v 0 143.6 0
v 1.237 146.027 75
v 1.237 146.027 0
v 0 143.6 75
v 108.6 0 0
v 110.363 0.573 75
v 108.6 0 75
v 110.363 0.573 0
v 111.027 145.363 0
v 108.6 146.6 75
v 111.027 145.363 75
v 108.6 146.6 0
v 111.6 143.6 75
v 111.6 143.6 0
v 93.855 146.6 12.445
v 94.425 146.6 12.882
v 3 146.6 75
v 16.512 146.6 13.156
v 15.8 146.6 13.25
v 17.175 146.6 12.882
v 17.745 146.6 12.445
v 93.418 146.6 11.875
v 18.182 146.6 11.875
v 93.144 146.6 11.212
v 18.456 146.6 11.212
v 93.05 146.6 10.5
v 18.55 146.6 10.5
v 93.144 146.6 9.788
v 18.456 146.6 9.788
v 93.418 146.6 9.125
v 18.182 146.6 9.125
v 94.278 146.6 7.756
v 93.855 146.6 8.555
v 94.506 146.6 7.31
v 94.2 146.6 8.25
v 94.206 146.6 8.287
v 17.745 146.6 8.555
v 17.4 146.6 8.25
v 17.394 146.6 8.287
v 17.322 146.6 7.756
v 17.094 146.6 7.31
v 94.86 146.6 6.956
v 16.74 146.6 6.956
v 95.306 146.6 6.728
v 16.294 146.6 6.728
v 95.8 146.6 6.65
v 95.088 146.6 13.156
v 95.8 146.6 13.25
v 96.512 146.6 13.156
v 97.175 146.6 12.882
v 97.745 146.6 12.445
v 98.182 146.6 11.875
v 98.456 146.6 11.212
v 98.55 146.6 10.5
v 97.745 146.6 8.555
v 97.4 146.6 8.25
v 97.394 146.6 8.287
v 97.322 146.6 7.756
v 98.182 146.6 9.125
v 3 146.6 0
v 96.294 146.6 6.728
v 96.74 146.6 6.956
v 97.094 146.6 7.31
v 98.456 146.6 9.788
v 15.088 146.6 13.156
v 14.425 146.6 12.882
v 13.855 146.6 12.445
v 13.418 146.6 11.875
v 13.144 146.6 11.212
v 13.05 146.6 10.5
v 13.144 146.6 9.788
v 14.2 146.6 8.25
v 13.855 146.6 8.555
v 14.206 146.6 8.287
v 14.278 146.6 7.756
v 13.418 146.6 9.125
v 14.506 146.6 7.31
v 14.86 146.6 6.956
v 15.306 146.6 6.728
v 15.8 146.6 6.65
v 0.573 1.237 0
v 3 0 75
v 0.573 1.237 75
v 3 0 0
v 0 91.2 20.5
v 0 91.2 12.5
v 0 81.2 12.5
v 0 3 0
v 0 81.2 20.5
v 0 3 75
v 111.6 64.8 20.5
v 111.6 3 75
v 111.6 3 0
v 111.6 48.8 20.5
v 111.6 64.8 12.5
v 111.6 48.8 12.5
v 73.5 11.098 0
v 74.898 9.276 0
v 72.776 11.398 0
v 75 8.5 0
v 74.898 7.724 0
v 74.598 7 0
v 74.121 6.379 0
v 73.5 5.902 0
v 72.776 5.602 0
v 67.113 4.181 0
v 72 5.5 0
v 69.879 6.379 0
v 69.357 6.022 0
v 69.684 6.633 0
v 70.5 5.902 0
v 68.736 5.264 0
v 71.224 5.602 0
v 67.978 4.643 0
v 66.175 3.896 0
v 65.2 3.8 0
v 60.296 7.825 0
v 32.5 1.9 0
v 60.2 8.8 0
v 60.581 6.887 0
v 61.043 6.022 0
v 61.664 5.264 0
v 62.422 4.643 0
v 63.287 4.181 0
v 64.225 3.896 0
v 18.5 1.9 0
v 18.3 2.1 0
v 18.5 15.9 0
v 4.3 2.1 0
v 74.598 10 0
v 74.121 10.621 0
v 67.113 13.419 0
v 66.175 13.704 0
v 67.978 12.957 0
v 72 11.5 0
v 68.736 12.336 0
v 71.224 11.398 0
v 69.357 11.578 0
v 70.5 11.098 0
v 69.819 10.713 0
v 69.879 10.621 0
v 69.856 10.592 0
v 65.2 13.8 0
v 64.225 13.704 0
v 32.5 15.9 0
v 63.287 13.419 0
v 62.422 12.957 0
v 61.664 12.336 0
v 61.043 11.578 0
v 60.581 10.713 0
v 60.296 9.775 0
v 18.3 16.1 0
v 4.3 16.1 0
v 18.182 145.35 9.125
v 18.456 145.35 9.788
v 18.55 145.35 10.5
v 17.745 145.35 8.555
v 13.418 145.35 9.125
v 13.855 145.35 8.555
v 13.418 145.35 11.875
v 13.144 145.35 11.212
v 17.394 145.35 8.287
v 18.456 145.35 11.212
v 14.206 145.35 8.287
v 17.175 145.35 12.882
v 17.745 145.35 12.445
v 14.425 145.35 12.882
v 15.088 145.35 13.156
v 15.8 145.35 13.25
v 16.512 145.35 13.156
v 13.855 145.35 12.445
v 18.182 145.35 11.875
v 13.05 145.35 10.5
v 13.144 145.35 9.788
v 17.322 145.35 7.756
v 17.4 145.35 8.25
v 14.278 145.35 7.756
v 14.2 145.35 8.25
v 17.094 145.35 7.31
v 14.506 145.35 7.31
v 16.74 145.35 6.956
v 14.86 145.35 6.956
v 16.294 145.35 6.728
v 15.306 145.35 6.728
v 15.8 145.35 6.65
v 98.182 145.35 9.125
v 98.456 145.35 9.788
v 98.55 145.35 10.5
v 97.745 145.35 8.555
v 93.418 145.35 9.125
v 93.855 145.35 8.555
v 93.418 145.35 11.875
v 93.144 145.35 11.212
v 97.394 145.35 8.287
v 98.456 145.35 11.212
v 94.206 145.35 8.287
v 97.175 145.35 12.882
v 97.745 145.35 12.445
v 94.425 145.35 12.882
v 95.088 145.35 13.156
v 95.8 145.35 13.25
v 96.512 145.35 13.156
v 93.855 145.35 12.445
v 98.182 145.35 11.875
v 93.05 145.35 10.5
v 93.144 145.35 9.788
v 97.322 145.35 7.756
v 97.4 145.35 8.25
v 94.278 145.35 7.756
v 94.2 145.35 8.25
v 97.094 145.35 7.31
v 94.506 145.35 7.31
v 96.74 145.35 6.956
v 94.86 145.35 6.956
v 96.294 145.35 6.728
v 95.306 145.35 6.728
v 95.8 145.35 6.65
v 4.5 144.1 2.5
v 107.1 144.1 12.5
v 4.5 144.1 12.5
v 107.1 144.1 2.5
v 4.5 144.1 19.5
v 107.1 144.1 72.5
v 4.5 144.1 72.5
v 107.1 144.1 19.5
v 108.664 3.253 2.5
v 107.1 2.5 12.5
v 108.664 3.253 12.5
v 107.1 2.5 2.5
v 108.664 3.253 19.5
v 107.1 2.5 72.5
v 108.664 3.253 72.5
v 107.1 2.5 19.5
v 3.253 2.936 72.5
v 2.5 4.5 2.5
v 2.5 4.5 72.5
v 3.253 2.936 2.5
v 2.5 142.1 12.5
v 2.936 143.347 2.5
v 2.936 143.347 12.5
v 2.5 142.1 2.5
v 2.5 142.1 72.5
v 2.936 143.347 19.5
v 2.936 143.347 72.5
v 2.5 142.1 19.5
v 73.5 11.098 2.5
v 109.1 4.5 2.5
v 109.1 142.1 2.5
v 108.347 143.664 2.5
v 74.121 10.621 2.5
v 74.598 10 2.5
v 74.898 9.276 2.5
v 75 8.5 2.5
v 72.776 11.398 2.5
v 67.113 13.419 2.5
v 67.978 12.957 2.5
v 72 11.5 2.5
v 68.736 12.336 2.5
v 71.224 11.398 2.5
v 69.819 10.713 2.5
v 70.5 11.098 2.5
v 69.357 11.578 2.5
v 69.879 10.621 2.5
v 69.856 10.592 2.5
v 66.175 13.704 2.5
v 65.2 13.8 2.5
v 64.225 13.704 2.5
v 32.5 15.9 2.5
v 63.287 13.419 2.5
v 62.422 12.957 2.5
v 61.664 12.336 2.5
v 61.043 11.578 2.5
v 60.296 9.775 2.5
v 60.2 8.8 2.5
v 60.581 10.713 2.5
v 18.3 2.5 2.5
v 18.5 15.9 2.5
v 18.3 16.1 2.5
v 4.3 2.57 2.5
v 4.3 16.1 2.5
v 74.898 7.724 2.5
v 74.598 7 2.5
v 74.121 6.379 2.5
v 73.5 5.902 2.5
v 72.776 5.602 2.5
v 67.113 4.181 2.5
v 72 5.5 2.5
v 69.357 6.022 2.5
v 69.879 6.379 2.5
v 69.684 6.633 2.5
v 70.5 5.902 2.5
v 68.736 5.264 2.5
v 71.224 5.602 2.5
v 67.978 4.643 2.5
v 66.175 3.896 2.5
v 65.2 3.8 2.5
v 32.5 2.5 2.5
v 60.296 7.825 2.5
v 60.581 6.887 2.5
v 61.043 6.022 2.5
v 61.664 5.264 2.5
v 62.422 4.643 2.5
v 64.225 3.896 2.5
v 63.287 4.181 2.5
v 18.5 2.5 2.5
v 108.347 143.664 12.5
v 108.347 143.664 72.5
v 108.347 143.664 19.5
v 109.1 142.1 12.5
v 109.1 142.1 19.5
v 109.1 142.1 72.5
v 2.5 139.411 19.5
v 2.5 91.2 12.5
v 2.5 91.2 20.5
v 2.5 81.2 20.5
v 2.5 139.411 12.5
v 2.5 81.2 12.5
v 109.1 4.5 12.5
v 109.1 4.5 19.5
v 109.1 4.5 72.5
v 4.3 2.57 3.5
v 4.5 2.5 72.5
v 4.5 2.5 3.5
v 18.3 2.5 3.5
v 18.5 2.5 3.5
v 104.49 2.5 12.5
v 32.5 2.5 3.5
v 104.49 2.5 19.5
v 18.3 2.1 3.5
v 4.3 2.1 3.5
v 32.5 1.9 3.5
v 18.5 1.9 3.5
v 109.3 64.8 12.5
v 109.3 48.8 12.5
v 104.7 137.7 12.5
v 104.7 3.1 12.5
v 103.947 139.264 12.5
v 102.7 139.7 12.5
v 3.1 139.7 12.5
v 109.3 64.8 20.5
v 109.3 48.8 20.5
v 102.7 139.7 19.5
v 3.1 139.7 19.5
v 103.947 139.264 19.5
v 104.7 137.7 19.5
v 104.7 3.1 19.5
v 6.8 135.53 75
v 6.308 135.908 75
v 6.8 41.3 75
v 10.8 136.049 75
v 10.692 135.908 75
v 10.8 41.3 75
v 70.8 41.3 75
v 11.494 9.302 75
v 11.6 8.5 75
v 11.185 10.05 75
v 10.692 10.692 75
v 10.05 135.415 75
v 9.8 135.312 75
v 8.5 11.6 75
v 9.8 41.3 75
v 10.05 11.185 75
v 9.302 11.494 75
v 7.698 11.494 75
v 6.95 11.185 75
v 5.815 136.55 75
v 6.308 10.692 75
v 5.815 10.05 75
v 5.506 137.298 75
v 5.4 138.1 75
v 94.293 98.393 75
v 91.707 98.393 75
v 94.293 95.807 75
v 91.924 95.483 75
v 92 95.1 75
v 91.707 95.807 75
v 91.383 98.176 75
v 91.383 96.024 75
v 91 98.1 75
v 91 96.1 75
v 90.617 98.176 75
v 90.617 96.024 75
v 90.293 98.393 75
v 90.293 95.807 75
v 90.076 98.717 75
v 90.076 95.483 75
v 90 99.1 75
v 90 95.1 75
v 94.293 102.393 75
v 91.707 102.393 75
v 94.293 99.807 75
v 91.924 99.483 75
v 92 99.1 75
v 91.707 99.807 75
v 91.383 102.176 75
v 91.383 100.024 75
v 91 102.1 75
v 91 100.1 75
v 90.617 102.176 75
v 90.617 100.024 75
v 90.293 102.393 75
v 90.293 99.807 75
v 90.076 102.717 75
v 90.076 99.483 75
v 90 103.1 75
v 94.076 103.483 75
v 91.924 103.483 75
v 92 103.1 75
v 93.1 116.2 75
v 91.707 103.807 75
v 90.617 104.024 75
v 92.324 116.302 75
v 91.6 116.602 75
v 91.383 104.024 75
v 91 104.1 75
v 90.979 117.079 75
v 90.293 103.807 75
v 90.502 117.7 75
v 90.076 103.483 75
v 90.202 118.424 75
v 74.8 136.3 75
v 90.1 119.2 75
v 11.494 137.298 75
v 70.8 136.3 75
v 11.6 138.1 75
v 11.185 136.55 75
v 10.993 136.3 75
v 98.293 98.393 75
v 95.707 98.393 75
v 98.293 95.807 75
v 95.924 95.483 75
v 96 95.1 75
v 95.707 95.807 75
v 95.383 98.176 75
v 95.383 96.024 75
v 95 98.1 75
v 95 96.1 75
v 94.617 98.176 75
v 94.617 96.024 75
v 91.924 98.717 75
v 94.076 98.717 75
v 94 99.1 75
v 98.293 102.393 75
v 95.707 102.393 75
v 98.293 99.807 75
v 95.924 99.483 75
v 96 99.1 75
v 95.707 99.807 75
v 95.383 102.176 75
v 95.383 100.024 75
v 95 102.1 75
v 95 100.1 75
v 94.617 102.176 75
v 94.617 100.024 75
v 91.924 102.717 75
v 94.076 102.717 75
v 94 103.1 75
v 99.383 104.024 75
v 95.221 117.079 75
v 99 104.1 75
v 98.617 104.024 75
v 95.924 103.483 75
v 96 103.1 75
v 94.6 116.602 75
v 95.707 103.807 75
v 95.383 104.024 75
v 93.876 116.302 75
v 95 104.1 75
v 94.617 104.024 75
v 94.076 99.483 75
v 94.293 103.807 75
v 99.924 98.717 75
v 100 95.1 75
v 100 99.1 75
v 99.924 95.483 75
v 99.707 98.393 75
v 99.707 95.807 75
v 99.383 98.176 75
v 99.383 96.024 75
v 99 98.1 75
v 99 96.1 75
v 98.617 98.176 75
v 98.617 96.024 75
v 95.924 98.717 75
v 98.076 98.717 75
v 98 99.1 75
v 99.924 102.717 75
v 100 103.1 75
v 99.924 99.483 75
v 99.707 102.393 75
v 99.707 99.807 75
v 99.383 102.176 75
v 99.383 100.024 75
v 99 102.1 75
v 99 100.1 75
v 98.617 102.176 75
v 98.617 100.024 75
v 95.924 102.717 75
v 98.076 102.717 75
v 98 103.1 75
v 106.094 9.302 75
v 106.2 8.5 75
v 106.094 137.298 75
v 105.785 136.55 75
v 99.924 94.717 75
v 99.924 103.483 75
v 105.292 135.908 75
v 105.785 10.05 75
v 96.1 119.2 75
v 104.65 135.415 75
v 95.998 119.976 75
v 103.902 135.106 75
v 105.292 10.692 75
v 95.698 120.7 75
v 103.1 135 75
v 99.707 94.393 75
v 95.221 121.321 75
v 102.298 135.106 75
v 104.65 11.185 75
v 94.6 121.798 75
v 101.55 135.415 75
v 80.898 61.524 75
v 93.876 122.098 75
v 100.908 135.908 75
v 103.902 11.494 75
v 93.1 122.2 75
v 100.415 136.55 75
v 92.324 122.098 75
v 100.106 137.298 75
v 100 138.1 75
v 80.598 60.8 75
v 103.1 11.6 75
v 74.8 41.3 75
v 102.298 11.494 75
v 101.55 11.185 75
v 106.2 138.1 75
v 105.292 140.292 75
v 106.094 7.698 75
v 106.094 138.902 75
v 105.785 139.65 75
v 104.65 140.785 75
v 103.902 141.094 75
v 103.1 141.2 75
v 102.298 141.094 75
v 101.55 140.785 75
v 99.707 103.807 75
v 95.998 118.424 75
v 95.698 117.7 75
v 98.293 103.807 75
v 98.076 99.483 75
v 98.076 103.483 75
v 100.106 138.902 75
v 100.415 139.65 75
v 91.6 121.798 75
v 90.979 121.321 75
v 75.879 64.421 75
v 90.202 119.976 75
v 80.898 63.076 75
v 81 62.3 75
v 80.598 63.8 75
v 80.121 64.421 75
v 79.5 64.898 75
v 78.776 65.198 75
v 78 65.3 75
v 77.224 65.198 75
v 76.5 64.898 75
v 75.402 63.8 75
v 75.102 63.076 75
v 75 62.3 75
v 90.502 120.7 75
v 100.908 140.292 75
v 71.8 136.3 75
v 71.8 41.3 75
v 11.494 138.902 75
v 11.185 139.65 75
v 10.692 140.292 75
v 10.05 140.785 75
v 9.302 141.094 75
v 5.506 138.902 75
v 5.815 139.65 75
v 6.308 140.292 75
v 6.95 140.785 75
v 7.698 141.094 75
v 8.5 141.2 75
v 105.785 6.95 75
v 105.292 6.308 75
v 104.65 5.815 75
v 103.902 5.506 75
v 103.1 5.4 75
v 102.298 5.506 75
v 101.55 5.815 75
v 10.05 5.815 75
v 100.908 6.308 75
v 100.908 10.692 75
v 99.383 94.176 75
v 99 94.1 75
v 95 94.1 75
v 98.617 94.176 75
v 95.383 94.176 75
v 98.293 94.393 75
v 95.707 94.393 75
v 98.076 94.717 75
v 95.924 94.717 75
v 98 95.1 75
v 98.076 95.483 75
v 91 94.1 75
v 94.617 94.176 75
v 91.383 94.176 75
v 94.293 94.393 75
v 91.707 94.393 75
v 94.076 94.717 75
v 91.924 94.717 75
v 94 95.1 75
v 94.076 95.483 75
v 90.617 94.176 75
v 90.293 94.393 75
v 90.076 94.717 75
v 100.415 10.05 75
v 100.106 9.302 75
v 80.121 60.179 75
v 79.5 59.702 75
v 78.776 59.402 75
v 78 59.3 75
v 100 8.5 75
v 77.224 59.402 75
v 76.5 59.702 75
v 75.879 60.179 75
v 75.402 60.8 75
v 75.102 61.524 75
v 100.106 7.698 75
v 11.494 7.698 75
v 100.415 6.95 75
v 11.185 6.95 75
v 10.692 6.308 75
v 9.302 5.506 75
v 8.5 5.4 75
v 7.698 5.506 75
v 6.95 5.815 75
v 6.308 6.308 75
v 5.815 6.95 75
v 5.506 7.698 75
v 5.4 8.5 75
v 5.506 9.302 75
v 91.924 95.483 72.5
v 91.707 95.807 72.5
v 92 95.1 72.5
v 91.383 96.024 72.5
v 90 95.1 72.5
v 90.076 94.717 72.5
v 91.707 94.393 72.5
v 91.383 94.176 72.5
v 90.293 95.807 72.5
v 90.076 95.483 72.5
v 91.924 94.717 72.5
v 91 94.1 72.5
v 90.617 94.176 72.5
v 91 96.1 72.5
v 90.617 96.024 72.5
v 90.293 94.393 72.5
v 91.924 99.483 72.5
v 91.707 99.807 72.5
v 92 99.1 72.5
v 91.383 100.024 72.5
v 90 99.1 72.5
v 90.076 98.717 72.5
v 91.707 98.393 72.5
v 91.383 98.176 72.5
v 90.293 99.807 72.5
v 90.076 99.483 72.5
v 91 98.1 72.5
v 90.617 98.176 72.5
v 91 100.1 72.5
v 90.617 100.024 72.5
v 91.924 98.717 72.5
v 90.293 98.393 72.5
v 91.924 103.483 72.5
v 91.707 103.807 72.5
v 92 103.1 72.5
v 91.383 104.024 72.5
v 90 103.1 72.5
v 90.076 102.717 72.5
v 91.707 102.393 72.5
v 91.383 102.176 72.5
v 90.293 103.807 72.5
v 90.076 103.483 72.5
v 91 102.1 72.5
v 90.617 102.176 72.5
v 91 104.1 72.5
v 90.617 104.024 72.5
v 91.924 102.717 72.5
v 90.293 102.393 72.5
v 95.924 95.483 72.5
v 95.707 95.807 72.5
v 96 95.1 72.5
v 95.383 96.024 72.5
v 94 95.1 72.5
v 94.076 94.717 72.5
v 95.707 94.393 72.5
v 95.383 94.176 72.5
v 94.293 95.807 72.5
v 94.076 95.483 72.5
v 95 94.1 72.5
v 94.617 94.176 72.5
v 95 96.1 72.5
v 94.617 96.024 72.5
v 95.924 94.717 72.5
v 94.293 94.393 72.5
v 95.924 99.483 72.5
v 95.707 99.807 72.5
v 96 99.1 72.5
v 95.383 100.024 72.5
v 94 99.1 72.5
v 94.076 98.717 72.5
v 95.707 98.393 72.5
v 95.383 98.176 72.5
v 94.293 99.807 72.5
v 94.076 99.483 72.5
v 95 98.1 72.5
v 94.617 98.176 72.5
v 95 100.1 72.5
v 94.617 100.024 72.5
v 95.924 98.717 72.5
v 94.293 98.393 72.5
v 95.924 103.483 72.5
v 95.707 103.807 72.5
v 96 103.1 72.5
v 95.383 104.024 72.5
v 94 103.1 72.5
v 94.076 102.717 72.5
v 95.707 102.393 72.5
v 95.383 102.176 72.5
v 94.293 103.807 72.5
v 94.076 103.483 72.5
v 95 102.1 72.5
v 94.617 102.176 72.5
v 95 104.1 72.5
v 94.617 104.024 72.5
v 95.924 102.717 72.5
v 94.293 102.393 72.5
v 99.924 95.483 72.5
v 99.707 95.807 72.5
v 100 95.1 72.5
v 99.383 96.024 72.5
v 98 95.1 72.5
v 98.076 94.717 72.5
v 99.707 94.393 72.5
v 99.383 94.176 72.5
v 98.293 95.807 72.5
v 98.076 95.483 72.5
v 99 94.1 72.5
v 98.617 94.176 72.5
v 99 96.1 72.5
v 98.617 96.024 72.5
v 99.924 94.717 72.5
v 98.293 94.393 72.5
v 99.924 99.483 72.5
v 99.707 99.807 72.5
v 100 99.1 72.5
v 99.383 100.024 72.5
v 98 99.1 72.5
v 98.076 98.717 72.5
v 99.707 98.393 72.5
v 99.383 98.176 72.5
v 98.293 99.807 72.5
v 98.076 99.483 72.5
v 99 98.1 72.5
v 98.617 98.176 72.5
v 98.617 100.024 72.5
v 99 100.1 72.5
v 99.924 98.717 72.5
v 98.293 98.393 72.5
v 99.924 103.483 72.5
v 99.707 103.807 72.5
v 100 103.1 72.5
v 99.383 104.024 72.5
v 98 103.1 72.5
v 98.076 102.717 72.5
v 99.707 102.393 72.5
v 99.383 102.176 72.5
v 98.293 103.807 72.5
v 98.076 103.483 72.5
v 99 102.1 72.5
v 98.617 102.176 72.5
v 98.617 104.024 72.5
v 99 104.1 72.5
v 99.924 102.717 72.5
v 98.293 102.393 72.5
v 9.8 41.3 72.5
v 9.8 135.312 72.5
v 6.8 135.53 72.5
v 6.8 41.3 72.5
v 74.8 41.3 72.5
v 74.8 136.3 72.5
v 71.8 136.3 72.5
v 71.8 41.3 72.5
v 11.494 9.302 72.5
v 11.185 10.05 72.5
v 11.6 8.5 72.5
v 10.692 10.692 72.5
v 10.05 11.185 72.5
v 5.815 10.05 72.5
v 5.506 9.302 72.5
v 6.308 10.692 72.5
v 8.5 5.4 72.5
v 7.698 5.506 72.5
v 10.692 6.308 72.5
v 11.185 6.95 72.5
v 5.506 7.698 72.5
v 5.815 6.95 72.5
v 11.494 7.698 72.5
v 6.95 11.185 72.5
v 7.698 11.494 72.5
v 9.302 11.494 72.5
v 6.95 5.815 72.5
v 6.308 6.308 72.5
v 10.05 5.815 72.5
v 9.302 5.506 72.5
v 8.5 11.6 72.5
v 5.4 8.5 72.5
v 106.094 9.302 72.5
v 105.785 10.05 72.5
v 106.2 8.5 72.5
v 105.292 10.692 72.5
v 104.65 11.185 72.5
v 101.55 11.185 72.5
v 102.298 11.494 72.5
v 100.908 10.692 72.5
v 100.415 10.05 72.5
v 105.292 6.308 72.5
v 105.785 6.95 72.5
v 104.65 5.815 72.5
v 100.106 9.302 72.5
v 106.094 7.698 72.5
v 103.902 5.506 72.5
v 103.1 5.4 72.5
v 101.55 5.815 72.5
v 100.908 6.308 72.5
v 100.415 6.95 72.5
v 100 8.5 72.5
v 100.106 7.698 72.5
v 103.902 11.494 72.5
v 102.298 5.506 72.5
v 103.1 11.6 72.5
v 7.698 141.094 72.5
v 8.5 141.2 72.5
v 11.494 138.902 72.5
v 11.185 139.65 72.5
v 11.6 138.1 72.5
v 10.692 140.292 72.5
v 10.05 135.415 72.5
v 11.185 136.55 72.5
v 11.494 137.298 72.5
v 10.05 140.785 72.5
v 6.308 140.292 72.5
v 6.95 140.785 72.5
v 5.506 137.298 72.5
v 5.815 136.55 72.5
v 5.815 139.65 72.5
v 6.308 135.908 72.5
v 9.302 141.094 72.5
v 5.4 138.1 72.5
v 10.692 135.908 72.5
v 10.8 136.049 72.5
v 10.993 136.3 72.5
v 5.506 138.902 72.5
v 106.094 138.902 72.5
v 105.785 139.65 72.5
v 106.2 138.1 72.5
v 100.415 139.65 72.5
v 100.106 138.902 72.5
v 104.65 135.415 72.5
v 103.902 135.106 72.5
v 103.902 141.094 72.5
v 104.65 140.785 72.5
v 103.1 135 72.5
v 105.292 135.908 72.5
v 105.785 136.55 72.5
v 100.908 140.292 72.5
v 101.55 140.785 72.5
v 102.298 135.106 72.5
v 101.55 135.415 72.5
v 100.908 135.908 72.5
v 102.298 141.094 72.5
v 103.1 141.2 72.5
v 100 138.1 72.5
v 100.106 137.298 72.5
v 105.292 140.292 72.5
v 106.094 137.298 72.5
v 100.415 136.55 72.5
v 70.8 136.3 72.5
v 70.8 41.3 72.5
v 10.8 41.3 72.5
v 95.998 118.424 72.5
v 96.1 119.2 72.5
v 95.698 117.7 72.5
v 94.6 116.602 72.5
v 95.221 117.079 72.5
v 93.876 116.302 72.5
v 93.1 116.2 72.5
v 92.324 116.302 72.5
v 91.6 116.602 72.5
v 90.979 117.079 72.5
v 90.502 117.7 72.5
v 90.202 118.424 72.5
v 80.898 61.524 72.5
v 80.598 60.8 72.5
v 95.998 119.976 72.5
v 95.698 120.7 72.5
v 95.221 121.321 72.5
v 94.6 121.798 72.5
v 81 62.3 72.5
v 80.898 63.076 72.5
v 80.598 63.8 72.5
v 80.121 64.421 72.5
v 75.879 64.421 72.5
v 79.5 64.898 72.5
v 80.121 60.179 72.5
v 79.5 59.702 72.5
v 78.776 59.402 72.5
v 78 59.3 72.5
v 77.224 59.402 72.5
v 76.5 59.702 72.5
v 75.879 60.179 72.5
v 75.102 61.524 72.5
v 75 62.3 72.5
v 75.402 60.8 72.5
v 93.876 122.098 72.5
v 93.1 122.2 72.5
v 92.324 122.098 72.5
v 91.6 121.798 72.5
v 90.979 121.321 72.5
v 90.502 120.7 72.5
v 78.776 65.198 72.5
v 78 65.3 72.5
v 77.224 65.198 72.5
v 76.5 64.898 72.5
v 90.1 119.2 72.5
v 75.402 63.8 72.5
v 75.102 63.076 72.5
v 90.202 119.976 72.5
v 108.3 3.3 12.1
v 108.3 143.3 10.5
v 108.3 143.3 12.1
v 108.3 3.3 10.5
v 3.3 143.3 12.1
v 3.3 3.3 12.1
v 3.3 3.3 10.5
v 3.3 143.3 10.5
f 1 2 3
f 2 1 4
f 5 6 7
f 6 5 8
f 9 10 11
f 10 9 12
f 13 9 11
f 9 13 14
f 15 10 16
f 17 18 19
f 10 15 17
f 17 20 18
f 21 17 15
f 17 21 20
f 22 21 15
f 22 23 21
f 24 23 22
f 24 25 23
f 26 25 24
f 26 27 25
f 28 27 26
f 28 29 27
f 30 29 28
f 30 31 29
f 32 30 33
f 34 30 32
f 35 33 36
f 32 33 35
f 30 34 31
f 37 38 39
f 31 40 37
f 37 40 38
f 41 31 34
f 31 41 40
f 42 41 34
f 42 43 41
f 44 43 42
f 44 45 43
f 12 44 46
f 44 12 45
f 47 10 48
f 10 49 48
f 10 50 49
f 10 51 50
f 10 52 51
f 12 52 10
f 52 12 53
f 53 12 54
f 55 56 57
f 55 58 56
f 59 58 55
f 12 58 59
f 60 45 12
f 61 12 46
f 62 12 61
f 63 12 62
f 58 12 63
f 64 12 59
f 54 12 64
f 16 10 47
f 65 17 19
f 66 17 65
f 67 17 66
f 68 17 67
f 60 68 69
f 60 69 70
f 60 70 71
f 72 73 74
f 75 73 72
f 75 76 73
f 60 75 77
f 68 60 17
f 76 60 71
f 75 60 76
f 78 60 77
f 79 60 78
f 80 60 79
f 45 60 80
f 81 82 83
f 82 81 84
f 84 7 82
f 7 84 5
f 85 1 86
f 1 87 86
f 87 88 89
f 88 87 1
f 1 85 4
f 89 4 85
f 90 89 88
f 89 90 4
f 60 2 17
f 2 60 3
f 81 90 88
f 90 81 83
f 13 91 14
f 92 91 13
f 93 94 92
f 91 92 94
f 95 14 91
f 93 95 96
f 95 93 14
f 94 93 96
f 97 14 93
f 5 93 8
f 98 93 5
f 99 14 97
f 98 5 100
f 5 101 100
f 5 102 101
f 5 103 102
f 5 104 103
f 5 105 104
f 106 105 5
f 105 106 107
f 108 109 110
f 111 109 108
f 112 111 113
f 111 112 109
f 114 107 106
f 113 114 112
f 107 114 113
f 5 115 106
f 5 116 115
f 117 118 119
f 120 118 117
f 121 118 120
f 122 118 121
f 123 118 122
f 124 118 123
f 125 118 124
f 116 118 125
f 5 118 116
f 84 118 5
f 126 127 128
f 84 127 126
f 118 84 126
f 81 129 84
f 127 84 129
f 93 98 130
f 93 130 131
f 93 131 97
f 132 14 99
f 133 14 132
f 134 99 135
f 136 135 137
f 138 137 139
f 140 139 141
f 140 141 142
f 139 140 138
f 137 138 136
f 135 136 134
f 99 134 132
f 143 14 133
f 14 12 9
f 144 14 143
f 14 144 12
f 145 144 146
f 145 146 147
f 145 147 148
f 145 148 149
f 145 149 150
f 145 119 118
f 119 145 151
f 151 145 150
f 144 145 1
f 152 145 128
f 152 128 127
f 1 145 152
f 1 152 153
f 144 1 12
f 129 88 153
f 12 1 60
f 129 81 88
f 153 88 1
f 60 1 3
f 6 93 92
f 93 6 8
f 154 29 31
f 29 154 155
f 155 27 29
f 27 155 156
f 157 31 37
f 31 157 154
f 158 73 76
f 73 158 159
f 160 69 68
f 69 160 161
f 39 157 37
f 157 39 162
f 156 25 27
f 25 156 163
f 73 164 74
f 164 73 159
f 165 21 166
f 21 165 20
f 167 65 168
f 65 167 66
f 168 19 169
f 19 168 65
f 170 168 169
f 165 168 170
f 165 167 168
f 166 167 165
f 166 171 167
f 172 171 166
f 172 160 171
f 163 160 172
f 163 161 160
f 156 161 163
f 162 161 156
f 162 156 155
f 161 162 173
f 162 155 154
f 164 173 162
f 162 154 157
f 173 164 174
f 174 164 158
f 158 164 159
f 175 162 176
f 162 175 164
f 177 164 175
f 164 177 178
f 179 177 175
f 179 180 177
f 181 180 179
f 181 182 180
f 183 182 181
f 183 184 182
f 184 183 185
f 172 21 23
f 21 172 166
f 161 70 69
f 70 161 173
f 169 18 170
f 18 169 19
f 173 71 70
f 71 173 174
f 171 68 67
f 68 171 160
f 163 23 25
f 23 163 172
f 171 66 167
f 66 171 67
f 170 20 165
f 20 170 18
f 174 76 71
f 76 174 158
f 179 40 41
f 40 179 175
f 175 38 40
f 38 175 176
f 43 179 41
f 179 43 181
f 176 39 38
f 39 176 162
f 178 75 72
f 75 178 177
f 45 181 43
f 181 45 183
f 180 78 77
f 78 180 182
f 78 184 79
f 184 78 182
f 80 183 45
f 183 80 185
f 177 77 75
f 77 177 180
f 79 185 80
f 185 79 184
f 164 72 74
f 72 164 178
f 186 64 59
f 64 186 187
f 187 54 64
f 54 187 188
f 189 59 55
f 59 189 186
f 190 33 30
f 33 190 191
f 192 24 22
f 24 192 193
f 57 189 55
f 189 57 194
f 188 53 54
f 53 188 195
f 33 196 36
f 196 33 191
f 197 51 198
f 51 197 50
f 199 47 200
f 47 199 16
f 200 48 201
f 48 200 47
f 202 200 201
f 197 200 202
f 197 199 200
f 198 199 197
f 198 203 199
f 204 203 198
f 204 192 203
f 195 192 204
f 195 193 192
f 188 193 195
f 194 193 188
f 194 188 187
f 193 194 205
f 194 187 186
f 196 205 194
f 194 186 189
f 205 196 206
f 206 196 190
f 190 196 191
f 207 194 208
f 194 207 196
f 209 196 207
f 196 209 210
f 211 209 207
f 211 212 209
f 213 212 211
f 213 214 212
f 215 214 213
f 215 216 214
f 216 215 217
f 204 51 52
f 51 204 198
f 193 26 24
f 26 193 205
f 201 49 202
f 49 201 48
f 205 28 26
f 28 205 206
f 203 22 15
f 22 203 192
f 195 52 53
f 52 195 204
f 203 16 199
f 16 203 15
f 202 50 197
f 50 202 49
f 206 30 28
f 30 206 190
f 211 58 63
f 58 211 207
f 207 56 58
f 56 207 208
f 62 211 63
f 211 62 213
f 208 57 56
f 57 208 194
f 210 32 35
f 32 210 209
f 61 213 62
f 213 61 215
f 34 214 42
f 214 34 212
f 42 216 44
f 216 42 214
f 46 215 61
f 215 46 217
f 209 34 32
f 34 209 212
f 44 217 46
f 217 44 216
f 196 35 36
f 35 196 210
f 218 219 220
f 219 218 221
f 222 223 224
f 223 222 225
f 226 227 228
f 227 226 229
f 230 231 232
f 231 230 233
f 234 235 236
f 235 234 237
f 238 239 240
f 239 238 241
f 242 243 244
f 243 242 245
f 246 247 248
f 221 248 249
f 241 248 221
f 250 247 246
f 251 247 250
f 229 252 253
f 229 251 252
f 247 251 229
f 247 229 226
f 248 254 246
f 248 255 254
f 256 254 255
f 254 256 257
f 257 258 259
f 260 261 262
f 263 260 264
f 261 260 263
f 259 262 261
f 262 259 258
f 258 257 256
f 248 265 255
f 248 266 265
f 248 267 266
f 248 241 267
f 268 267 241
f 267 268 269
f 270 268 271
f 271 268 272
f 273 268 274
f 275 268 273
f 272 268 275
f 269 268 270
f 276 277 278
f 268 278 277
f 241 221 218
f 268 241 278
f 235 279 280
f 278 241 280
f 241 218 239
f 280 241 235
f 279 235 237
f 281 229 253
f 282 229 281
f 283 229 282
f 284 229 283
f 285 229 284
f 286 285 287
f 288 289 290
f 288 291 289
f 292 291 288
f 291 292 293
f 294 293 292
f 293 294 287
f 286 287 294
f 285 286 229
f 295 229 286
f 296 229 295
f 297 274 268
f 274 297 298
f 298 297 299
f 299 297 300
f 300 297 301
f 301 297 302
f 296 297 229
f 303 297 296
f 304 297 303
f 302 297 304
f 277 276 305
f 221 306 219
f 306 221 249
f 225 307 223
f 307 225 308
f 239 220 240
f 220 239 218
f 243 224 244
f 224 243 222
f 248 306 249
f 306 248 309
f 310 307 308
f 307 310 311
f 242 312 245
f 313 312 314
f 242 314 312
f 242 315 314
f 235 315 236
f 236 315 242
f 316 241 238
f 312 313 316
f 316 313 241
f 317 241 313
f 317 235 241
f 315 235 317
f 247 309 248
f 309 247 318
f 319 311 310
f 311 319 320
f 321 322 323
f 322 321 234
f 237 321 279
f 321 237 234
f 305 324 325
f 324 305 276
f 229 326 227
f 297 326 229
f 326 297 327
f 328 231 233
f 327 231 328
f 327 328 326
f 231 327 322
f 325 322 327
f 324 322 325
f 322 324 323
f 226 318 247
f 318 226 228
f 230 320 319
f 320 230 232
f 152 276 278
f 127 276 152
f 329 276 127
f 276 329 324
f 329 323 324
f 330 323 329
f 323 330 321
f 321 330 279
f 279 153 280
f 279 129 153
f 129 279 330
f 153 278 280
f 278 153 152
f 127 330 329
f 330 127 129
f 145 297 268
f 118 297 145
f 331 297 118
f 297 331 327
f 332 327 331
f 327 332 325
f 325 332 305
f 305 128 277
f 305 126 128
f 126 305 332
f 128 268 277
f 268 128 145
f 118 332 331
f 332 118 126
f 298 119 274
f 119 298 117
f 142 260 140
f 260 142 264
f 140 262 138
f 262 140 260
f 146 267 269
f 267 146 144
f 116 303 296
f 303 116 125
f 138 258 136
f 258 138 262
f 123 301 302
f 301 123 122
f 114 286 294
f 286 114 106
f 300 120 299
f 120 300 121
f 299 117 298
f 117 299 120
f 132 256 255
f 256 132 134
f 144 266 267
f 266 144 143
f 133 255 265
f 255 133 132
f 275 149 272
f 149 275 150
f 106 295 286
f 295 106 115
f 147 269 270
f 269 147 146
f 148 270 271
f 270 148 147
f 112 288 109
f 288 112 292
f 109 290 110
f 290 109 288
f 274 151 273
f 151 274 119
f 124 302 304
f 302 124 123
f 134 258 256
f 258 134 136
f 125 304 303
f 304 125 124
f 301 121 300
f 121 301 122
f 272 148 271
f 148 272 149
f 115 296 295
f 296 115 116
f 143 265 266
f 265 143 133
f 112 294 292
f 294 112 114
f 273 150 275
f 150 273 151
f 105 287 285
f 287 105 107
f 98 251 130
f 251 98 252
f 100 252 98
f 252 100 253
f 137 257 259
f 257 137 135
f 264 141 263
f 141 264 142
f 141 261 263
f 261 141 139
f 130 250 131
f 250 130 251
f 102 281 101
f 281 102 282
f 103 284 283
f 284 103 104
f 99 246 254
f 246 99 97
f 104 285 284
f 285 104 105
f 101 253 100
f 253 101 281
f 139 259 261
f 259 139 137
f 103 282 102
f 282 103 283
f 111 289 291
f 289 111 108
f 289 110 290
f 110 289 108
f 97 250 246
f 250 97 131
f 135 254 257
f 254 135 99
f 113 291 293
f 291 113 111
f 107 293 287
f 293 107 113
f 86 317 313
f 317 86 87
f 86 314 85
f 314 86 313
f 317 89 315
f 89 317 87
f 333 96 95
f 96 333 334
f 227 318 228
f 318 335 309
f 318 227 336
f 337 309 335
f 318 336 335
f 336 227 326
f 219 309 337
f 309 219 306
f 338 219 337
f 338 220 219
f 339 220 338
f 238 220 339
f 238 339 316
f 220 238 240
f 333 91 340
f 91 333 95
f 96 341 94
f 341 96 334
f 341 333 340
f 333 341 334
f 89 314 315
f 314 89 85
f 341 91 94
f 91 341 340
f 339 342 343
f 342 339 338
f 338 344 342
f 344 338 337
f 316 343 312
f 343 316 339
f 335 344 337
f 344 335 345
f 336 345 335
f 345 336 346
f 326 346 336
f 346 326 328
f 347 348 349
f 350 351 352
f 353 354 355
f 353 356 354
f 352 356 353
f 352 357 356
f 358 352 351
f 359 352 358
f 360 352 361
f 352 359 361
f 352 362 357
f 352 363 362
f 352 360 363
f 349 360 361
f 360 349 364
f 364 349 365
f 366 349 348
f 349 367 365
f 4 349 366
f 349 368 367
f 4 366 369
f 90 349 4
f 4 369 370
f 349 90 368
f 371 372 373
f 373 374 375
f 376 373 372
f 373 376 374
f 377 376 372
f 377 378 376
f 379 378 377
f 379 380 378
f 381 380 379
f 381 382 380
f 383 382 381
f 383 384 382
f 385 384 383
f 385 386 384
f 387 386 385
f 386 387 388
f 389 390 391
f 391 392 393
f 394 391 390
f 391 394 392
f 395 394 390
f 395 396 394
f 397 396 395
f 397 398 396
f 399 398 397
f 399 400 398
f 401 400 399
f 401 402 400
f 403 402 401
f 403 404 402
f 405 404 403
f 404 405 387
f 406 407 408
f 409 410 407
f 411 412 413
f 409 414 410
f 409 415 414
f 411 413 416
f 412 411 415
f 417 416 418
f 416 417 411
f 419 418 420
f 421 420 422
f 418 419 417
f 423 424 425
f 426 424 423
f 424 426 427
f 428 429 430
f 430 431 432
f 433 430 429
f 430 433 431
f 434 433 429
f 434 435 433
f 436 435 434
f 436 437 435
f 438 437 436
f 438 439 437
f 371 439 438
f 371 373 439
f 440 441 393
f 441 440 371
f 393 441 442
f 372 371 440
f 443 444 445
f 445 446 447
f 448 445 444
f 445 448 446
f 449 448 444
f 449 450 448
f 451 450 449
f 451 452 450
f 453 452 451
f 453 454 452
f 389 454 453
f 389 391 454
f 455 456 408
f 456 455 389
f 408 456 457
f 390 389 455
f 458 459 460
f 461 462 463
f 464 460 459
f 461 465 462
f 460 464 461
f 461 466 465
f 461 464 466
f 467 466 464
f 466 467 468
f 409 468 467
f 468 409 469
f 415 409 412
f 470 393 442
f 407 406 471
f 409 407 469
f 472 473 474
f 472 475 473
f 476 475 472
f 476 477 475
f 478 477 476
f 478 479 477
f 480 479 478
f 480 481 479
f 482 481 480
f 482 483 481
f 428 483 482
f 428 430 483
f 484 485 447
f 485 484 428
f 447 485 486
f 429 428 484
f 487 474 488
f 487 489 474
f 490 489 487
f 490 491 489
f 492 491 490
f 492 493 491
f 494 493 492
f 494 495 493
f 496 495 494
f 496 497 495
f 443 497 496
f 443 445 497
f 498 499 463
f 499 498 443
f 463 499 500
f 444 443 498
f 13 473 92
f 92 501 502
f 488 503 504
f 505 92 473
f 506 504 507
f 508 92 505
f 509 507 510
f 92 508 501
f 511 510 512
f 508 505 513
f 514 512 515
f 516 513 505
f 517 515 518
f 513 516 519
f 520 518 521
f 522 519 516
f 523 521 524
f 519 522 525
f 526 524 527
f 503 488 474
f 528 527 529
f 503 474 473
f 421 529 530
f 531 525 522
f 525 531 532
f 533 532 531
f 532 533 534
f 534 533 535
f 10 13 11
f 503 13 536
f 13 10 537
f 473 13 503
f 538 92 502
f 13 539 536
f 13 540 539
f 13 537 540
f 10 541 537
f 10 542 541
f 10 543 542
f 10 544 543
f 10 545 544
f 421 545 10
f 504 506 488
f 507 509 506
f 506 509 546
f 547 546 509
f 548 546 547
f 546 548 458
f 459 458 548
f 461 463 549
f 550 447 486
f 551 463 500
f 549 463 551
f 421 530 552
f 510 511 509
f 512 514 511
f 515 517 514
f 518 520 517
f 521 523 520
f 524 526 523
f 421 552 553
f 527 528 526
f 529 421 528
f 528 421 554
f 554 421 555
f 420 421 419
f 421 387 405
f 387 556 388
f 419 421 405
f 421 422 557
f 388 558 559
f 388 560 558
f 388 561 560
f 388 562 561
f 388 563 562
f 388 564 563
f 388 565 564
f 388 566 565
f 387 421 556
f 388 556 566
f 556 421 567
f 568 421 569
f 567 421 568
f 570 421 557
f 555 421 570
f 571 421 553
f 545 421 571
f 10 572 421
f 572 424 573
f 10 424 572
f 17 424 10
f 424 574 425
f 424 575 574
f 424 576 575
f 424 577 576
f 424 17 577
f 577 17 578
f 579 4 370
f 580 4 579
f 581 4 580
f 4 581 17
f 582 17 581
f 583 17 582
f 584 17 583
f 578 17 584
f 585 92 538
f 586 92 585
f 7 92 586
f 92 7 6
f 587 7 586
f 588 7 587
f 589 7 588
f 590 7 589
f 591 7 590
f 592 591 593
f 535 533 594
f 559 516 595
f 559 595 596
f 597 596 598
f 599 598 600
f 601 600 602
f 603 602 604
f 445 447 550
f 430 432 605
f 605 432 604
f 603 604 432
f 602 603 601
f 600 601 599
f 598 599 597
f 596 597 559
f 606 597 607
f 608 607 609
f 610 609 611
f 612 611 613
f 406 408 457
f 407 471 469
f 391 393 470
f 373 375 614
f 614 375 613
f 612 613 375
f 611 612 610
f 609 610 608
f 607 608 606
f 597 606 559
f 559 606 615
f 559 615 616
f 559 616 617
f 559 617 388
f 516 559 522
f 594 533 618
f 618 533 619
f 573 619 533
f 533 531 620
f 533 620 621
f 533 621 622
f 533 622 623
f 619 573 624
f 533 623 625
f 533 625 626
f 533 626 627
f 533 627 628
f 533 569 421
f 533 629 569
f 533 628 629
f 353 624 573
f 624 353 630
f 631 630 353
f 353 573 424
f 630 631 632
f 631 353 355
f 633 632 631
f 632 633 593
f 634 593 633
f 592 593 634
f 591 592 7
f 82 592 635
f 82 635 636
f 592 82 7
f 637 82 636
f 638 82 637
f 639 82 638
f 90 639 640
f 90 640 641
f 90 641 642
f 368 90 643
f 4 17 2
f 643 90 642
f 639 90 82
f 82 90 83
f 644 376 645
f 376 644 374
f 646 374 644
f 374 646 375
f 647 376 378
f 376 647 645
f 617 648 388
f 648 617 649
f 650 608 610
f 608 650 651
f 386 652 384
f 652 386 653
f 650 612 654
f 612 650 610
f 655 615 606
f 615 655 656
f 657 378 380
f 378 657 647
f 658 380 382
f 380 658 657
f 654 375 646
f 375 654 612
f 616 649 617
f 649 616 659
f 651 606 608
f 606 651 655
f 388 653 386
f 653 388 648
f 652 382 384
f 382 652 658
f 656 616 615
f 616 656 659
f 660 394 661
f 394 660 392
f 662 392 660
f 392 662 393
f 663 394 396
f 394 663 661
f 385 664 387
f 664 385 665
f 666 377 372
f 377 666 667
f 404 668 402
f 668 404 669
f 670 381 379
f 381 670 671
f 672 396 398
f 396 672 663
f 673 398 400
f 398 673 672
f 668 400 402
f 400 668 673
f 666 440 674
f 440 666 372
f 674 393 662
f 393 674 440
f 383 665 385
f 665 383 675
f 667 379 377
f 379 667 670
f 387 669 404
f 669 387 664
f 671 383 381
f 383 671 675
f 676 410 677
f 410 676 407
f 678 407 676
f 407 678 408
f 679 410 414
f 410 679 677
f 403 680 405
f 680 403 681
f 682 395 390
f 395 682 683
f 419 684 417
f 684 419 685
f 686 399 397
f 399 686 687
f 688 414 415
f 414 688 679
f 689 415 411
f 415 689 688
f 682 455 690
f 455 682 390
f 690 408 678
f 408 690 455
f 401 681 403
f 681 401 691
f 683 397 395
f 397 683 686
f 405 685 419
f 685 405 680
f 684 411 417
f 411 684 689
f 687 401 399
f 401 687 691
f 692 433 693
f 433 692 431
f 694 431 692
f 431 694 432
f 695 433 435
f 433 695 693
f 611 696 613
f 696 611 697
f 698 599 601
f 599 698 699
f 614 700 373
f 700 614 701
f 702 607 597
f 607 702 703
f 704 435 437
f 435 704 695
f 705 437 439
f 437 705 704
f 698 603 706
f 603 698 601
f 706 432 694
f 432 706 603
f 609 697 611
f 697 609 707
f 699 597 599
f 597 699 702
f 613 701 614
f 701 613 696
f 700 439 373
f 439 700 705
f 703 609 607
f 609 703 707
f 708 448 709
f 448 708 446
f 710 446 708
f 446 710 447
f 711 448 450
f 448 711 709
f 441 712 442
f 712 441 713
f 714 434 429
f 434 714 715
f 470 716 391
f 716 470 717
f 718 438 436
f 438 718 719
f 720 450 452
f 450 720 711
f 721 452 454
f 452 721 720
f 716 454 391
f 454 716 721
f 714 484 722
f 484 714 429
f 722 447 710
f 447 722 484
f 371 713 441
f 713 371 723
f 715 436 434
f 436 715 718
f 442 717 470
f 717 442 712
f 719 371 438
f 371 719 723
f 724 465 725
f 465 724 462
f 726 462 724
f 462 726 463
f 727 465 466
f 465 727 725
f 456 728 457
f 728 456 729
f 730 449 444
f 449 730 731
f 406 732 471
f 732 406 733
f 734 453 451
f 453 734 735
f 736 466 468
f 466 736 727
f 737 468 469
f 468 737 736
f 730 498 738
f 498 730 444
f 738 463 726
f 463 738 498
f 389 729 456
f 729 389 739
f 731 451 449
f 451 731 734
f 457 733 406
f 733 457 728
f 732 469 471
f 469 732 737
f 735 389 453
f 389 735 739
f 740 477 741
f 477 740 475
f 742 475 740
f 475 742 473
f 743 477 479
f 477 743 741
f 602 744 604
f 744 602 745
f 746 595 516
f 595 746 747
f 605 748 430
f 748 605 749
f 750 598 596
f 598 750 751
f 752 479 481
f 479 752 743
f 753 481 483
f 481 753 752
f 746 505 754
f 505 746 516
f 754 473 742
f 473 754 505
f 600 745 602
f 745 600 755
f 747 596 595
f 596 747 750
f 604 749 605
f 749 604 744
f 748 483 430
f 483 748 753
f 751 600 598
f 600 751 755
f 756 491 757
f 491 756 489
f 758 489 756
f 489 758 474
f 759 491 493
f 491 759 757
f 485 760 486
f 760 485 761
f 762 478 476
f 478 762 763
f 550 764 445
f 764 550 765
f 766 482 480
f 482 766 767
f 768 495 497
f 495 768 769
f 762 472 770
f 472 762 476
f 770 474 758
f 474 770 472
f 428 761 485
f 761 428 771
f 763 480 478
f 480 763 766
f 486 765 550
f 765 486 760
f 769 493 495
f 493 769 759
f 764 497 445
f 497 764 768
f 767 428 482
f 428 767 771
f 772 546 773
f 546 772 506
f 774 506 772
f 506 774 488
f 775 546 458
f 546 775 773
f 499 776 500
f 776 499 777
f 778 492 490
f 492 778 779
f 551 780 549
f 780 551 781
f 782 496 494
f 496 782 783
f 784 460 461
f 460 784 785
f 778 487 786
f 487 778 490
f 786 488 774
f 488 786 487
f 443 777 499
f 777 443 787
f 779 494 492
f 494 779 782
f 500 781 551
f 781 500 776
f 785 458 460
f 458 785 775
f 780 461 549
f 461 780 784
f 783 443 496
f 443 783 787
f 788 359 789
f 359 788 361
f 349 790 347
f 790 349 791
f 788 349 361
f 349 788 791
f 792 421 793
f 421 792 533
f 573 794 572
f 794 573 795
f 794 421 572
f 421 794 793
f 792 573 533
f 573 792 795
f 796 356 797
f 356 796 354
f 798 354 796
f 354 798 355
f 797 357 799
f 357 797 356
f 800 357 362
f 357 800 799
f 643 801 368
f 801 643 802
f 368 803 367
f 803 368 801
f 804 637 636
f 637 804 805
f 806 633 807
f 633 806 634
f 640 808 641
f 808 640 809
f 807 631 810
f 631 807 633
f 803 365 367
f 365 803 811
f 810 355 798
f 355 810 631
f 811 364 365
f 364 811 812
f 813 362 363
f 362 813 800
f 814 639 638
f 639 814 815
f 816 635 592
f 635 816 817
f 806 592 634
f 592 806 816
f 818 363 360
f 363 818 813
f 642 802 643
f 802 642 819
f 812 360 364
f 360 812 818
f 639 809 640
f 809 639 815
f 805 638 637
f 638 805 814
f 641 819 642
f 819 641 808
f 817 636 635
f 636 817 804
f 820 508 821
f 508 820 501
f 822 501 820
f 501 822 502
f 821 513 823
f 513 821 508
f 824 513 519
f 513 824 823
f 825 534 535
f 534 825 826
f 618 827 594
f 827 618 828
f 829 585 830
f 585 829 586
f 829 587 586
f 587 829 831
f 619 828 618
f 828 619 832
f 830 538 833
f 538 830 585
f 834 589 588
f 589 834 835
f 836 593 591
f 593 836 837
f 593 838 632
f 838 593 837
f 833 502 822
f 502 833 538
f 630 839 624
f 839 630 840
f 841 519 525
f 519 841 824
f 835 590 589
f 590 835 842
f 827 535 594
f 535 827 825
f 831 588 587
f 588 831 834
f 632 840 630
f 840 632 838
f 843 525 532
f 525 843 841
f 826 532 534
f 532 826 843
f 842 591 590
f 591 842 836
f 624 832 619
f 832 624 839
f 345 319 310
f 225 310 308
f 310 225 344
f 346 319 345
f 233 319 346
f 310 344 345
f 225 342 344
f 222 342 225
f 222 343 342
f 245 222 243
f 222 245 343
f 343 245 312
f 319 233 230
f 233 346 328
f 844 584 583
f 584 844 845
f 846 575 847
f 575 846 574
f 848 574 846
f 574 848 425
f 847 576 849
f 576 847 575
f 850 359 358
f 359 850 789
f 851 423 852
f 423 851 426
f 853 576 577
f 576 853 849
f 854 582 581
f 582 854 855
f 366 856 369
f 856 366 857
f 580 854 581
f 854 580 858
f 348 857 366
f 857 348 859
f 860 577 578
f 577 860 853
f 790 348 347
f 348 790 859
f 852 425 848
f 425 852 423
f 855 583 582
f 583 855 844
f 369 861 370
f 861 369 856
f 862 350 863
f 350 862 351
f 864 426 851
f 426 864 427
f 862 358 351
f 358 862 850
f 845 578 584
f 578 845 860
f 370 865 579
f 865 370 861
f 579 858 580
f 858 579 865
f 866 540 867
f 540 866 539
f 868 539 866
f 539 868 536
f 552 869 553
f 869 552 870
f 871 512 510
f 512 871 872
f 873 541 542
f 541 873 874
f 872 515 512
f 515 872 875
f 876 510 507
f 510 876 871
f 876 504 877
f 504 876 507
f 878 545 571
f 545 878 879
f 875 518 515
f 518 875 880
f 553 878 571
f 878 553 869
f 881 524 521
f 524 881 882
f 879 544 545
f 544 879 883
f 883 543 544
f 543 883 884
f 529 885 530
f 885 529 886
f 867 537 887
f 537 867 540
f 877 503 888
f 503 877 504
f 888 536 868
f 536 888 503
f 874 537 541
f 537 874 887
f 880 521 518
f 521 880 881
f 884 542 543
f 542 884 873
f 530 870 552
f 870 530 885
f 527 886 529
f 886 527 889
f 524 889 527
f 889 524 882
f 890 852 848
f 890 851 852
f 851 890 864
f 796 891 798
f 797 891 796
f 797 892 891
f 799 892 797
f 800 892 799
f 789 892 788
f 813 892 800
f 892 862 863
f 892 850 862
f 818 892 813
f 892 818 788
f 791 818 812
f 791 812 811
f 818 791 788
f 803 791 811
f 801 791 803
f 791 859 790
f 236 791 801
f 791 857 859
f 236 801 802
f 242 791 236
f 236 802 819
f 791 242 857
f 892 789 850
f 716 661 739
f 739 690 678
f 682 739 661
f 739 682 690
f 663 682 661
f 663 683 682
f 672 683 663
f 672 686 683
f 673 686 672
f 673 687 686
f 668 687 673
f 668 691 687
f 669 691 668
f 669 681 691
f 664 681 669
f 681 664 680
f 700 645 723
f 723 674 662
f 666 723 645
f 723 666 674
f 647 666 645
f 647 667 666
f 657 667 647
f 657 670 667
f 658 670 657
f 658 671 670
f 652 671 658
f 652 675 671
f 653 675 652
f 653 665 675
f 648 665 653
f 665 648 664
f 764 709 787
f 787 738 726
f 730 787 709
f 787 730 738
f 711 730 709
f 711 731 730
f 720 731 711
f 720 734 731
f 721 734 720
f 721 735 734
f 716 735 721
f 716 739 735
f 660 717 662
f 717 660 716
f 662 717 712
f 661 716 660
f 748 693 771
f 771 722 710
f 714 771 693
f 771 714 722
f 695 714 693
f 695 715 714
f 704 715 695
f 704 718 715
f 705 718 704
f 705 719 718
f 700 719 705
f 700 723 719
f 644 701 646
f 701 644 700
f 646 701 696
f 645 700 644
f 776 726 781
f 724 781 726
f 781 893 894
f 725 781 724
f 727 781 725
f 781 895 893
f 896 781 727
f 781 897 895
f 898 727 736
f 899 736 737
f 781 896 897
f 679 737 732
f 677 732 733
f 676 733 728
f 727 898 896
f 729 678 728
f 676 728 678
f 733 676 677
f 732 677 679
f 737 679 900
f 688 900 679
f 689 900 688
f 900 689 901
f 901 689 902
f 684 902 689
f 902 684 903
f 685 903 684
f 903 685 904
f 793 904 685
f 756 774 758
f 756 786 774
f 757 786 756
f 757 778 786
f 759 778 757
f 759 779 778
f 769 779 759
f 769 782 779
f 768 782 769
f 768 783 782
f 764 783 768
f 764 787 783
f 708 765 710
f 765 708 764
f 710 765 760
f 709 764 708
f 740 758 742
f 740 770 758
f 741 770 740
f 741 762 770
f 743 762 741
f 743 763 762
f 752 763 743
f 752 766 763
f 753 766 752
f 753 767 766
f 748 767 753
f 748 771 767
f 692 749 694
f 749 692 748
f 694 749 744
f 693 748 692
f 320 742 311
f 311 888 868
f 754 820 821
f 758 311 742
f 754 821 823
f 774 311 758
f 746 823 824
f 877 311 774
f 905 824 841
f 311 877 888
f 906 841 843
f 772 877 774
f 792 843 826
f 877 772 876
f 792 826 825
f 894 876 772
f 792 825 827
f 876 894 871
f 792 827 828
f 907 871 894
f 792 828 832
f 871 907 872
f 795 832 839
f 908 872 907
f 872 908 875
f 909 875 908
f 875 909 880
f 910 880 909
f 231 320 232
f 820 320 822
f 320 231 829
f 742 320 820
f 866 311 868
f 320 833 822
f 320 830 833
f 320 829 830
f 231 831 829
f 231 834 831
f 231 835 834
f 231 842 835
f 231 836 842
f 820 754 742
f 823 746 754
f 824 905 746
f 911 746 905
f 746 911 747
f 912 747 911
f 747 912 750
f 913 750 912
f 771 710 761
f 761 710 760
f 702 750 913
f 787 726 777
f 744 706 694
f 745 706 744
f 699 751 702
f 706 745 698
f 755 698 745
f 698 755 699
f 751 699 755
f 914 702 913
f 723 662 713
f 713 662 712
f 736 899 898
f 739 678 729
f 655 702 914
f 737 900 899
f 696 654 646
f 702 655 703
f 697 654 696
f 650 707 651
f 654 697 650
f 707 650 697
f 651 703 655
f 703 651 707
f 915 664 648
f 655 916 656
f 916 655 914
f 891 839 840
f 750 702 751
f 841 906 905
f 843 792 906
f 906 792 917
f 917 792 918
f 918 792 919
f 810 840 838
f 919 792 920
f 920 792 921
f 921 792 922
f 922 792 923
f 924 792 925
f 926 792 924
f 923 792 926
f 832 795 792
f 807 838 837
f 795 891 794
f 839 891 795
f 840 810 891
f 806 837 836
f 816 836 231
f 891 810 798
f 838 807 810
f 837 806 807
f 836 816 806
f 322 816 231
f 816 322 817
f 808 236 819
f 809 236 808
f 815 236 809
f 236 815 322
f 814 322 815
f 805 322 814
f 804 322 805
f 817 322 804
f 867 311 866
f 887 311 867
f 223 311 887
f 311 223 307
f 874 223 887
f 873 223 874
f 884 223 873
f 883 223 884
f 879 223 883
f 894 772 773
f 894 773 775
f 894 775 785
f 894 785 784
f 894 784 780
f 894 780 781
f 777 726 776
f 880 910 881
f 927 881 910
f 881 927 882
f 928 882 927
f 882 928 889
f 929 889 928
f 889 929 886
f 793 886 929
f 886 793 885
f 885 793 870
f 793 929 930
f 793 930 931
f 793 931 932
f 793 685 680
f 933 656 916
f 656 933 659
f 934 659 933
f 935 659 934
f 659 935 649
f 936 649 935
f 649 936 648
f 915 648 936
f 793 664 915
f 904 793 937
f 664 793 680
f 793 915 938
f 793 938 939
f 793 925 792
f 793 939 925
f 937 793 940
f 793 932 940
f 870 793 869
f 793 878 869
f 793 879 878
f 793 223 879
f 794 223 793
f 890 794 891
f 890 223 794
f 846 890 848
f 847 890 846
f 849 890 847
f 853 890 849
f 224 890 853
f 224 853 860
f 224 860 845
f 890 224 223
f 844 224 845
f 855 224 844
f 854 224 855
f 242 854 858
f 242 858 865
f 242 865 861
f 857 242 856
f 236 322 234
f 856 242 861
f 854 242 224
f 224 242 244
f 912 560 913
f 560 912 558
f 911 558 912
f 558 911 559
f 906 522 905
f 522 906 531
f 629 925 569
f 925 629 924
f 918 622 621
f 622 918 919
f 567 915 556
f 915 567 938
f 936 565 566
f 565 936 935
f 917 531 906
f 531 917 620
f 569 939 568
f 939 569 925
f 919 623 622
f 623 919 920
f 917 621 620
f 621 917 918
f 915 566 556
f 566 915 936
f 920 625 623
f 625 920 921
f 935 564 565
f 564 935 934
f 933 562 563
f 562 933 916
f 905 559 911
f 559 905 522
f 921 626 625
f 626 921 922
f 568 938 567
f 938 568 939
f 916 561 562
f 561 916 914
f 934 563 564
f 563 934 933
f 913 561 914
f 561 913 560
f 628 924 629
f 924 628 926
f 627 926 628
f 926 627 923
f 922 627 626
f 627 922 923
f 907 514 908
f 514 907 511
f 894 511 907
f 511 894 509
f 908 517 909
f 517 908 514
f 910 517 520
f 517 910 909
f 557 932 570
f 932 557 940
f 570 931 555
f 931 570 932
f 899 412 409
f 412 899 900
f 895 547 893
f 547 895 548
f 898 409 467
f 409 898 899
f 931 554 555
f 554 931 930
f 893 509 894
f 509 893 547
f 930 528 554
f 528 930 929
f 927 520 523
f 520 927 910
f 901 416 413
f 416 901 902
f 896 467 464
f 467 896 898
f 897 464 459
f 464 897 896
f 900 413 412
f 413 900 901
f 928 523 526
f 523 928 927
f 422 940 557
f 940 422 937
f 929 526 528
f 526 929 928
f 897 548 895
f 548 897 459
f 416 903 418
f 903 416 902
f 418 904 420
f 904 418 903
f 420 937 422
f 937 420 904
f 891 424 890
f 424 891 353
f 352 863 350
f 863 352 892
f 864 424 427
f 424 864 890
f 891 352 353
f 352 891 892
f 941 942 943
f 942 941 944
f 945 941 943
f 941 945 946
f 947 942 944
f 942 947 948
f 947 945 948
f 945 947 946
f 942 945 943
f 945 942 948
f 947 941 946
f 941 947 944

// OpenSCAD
// ============================================================
// 火眼载板外壳 — 上下盖 + 四角螺丝 + 挂壁
// 载板 105 x 140 mm（嘉立创 EDA 实测）
// 用法：OpenSCAD 打开 → F6 渲染 → 导出 STL
//   bottom_shell();  // 下盖
//   top_cover();     // 上盖
//   assembly();      // 预览（默认）
// ============================================================

part = "assembly"; // "bottom_shell" | "top_cover" | "assembly"

// ---------- 载板 ----------
pcb_l   = 105;      // X
pcb_w   = 140;      // Y
pcb_t   = 1.6;

// ---------- 外壳 ----------
wall    = 2.5;
clearance = 0.4;    // 装配间隙
standoff_h = 8;     // 板下立柱（通孔焊脚净空）
inner_above_pcb = 42; // 载板上方净高（含 START 叠层 ≈27、继电器 15.8）

// 外壳内腔（含间隙）
inner_l = pcb_l + 2*clearance + 0.8; // 边框限位
inner_w = pcb_w + 2*clearance + 0.8;
inner_h = standoff_h + pcb_t + inner_above_pcb;

// 外轮廓
out_l = inner_l + 2*wall;
out_w = inner_w + 2*wall;
bottom_shell_h = wall + standoff_h + pcb_t + 12; // 侧壁罩住板下与低矮件
top_cover_h    = inner_h - (standoff_h + pcb_t - 8) + wall; // 余量给上盖侧壁搭接

// 简化：两段高度
bot_h = wall + standoff_h + 18;          // ≈28.5
top_h = wall + inner_above_pcb + 10;     // ≈54.5 → 合盖总高 ≈ 83（含搭接重叠）

// ---------- 螺丝柱 ----------
screw_d      = 3.2;   // M3 自攻底孔
screw_head_d = 6.2;
post_d       = 8;
post_inset   = 6;     // 距内壁

// ---------- 挂壁键孔 ----------
keyhole_head_d = 5.5;
keyhole_neck_d = 3.2;
keyhole_span   = 80;
keyhole_top    = 18;

// ---------- 接口坐标（载板左下角原点，X 右 Y 上）----------
// 下盖 · 底壁
u7  = [8.0, 5.8];    u7_slot  = [14, 14];
u8  = [22.2, 5.6];   u8_slot  = [14, 14];
dc1 = [61.9, 5.5];   dc1_d    = 10;
led1 = [68.7, 5.2];  led1_d   = 6;
// 左壁 / 右壁
u10_y = 82.9;        u10_slot = [16, 10];   // 深度方向 X
u9_y  = 53.5;        u9_slot  = [30, 16];
// 上盖 · 顶面
buzz = [91.7, 95.8]; buzz_d = 2; buzz_n = 9;
h1   = [38.1, 102.4]; h1_slot = [30, 12];
h2   = [74.7, 59.0];  h2_d    = 6;
u11  = [89.8, 115.9]; u11_d   = 6;
// START 板覆盖区（上盖开窗）
start_x = [7.5, 67.5];
start_y = [38, 133];

// 模型坐标原点：外壳外轮廓左下角，X 右，Y 上，Z 下盖底面
// 载板在壳内的偏移
pcb_ox = wall + clearance + 0.4;
pcb_oy = wall + clearance + 0.4;
pcb_oz = wall + standoff_h;

// ---------- 工具 ----------
module rounded_rect(l, w, h, r=2, center=false) {
    translate(center ? [-l/2, -w/2, 0] : [0, 0, 0])
    linear_extrude(h)
        offset(r) offset(-r)
            square([l, w]);
}

// 四角柱坐标
function post_pos() = [
    [wall + post_inset,           wall + post_inset],
    [out_l - wall - post_inset,   wall + post_inset],
    [wall + post_inset,           out_w - wall - post_inset],
    [out_l - wall - post_inset,   out_w - wall - post_inset]
];

module screw_posts(h, blind=true) {
    for (p = post_pos()) {
        translate([p[0], p[1], 0]) {
            difference() {
                cylinder(h=h, d=post_d, $fn=32);
                translate([0, 0, blind ? h-14 : -1])
                    cylinder(h=blind ? 15 : h+2, d=screw_d, $fn=24);
            }
        }
    }
}

module screw_head_relief(h=6) {
    for (p = post_pos()) {
        translate([p[0], p[1], h-3])
            cylinder(h=4, d=screw_head_d, $fn=24);
    }
}

// ============================================================
// 下盖
// ============================================================
module bottom_shell() {
    difference() {
        union() {
            // 外壳体
            rounded_rect(out_l, out_w, bot_h, r=3);
            // 立柱（托载板）
            translate([0, 0, wall])
                screw_posts(standoff_h + 20, blind=true);
            // 板周限位边框（高 3 mm）
            translate([pcb_ox-1, pcb_oy-1, wall+standoff_h])
                difference() {
                    rounded_rect(pcb_l+2, pcb_w+2, 3, r=1);
                    translate([1, 1, -0.1])
                        rounded_rect(pcb_l, pcb_w, 3.2, r=1);
                }
        }

        // 掏内腔
        translate([wall, wall, wall])
            rounded_rect(inner_l, inner_w, bot_h, r=2);

        // ---- 底壁开孔（映射：壳内 pcb_ox + 载板坐标）----
        // U7
        translate([pcb_ox + u7[0] - u7_slot[0]/2,
                   pcb_oy + u7[1] - u7_slot[1]/2, -1])
            cube([u7_slot[0], u7_slot[1], wall+2]);
        // U8
        translate([pcb_ox + u8[0] - u8_slot[0]/2,
                   pcb_oy + u8[1] - u8_slot[1]/2, -1])
            cube([u8_slot[0], u8_slot[1], wall+2]);
        // DC1
        translate([pcb_ox + dc1[0], pcb_oy + dc1[1], -1])
            cylinder(h=wall+2, d=dc1_d, $fn=32);
        // LED1 导光孔
        translate([pcb_ox + led1[0], pcb_oy + led1[1], -1])
            cylinder(h=wall+2, d=led1_d, $fn=24);

        // ---- 左壁 U10 串口槽 ----
        translate([-1, pcb_oy + u10_y - u10_slot[1]/2, wall + standoff_h + 2])
            cube([wall+2, u10_slot[1], u10_slot[0]]);

        // ---- 右壁 U9 / W5500 槽 ----
        translate([out_l - wall - 1, pcb_oy + u9_y - u9_slot[1]/2, wall + standoff_h + 2])
            cube([wall+2, u9_slot[1], u9_slot[0]]);

        // ---- 挂壁键孔（后壁 = +Y 外侧）----
        for (dx = [-keyhole_span/2, keyhole_span/2]) {
            translate([out_l/2 + dx, out_w - wall/2, bot_h - keyhole_top]) {
                rotate([-90, 0, 0]) {
                    cylinder(h=wall+2, d=keyhole_head_d, $fn=24);
                    translate([0, keyhole_head_d/2 - 0.5, 0])
                        cylinder(h=wall+2, d=keyhole_neck_d, $fn=20);
                }
            }
        }

        // 螺丝头让位
        translate([0, 0, bot_h-8]) screw_head_relief(8);
    }
}

// ============================================================
// 上盖
// ============================================================
module top_cover() {
    translate([0, 0, 0])
    difference() {
        union() {
            rounded_rect(out_l, out_w, top_h, r=3);
            // 内侧搭接唇（插进下盖内腔）
            translate([wall - clearance, wall - clearance, -8])
                difference() {
                    rounded_rect(inner_l + 2*clearance - 0.2,
                                 inner_w + 2*clearance - 0.2, 8, r=2);
                    translate([-1, -1, -0.1])
                        rounded_rect(inner_l - 2*wall + 2,
                                     inner_w - 2*wall + 2, 8.2, r=2);
                }
        }

        // 掏内腔（顶面留 2.5 壁）
        translate([wall, wall, -1])
            rounded_rect(inner_l, inner_w, top_h - wall + 1, r=2);

        // ---- 顶面 · 蜂鸣器声孔阵列 ----
        for (i = [0:2], j = [0:2]) {
            translate([pcb_ox + buzz[0] + (i-1)*4,
                       pcb_oy + buzz[1] + (j-1)*4, top_h - wall - 1])
                cylinder(h=wall+2, d=buzz_d, $fn=16);
        }

        // ---- 顶面 · OLED 窗 ----
        translate([pcb_ox + h1[0] - h1_slot[0]/2,
                   pcb_oy + h1[1] - h1_slot[1]/2, top_h - wall - 1])
            cube([h1_slot[0], h1_slot[1], wall+2]);

        // ---- 顶面 · H2 / U11 出线孔 ----
        translate([pcb_ox + h2[0], pcb_oy + h2[1], top_h - wall - 1])
            cylinder(h=wall+2, d=h2_d, $fn=24);
        translate([pcb_ox + u11[0], pcb_oy + u11[1], top_h - wall - 1])
            cylinder(h=wall+2, d=u11_d, $fn=24);

        // ---- 顶面 · START 板开窗（USB / 按键 / GD-Link）----
        translate([pcb_ox + start_x[0], pcb_oy + start_y[0], top_h - wall - 1])
            cube([start_x[1]-start_x[0], start_y[1]-start_y[0], wall+2]);

        // ---- 顶面 · 散热缝（START 区两侧）----
        for (sx = [start_x[0]-4, start_x[1]+1]) {
            translate([pcb_ox + sx, pcb_oy + start_y[0], top_h - wall - 1])
                cube([3, start_y[1]-start_y[0], wall+2]);
        }

        // ---- 顶面 · 螺丝通孔 ----
        for (p = post_pos()) {
            translate([p[0], p[1], top_h - wall - 1])
                cylinder(h=wall+2, d=screw_head_d, $fn=24);
            translate([p[0], p[1], -1])
                cylinder(h=top_h + 2, d=screw_d, $fn=24);
        }
    }
}

// ============================================================
// 预览装配
// ============================================================
module assembly() {
    color("SteelBlue") bottom_shell();
    color("Silver")
        translate([pcb_ox, pcb_oy, pcb_oz])
            cube([pcb_l, pcb_w, pcb_t]);
    color("Orange")
        translate([0, 0, bot_h - 8])
            top_cover();
}

if (part == "bottom_shell") bottom_shell();
else if (part == "top_cover") top_cover();
else assembly();
